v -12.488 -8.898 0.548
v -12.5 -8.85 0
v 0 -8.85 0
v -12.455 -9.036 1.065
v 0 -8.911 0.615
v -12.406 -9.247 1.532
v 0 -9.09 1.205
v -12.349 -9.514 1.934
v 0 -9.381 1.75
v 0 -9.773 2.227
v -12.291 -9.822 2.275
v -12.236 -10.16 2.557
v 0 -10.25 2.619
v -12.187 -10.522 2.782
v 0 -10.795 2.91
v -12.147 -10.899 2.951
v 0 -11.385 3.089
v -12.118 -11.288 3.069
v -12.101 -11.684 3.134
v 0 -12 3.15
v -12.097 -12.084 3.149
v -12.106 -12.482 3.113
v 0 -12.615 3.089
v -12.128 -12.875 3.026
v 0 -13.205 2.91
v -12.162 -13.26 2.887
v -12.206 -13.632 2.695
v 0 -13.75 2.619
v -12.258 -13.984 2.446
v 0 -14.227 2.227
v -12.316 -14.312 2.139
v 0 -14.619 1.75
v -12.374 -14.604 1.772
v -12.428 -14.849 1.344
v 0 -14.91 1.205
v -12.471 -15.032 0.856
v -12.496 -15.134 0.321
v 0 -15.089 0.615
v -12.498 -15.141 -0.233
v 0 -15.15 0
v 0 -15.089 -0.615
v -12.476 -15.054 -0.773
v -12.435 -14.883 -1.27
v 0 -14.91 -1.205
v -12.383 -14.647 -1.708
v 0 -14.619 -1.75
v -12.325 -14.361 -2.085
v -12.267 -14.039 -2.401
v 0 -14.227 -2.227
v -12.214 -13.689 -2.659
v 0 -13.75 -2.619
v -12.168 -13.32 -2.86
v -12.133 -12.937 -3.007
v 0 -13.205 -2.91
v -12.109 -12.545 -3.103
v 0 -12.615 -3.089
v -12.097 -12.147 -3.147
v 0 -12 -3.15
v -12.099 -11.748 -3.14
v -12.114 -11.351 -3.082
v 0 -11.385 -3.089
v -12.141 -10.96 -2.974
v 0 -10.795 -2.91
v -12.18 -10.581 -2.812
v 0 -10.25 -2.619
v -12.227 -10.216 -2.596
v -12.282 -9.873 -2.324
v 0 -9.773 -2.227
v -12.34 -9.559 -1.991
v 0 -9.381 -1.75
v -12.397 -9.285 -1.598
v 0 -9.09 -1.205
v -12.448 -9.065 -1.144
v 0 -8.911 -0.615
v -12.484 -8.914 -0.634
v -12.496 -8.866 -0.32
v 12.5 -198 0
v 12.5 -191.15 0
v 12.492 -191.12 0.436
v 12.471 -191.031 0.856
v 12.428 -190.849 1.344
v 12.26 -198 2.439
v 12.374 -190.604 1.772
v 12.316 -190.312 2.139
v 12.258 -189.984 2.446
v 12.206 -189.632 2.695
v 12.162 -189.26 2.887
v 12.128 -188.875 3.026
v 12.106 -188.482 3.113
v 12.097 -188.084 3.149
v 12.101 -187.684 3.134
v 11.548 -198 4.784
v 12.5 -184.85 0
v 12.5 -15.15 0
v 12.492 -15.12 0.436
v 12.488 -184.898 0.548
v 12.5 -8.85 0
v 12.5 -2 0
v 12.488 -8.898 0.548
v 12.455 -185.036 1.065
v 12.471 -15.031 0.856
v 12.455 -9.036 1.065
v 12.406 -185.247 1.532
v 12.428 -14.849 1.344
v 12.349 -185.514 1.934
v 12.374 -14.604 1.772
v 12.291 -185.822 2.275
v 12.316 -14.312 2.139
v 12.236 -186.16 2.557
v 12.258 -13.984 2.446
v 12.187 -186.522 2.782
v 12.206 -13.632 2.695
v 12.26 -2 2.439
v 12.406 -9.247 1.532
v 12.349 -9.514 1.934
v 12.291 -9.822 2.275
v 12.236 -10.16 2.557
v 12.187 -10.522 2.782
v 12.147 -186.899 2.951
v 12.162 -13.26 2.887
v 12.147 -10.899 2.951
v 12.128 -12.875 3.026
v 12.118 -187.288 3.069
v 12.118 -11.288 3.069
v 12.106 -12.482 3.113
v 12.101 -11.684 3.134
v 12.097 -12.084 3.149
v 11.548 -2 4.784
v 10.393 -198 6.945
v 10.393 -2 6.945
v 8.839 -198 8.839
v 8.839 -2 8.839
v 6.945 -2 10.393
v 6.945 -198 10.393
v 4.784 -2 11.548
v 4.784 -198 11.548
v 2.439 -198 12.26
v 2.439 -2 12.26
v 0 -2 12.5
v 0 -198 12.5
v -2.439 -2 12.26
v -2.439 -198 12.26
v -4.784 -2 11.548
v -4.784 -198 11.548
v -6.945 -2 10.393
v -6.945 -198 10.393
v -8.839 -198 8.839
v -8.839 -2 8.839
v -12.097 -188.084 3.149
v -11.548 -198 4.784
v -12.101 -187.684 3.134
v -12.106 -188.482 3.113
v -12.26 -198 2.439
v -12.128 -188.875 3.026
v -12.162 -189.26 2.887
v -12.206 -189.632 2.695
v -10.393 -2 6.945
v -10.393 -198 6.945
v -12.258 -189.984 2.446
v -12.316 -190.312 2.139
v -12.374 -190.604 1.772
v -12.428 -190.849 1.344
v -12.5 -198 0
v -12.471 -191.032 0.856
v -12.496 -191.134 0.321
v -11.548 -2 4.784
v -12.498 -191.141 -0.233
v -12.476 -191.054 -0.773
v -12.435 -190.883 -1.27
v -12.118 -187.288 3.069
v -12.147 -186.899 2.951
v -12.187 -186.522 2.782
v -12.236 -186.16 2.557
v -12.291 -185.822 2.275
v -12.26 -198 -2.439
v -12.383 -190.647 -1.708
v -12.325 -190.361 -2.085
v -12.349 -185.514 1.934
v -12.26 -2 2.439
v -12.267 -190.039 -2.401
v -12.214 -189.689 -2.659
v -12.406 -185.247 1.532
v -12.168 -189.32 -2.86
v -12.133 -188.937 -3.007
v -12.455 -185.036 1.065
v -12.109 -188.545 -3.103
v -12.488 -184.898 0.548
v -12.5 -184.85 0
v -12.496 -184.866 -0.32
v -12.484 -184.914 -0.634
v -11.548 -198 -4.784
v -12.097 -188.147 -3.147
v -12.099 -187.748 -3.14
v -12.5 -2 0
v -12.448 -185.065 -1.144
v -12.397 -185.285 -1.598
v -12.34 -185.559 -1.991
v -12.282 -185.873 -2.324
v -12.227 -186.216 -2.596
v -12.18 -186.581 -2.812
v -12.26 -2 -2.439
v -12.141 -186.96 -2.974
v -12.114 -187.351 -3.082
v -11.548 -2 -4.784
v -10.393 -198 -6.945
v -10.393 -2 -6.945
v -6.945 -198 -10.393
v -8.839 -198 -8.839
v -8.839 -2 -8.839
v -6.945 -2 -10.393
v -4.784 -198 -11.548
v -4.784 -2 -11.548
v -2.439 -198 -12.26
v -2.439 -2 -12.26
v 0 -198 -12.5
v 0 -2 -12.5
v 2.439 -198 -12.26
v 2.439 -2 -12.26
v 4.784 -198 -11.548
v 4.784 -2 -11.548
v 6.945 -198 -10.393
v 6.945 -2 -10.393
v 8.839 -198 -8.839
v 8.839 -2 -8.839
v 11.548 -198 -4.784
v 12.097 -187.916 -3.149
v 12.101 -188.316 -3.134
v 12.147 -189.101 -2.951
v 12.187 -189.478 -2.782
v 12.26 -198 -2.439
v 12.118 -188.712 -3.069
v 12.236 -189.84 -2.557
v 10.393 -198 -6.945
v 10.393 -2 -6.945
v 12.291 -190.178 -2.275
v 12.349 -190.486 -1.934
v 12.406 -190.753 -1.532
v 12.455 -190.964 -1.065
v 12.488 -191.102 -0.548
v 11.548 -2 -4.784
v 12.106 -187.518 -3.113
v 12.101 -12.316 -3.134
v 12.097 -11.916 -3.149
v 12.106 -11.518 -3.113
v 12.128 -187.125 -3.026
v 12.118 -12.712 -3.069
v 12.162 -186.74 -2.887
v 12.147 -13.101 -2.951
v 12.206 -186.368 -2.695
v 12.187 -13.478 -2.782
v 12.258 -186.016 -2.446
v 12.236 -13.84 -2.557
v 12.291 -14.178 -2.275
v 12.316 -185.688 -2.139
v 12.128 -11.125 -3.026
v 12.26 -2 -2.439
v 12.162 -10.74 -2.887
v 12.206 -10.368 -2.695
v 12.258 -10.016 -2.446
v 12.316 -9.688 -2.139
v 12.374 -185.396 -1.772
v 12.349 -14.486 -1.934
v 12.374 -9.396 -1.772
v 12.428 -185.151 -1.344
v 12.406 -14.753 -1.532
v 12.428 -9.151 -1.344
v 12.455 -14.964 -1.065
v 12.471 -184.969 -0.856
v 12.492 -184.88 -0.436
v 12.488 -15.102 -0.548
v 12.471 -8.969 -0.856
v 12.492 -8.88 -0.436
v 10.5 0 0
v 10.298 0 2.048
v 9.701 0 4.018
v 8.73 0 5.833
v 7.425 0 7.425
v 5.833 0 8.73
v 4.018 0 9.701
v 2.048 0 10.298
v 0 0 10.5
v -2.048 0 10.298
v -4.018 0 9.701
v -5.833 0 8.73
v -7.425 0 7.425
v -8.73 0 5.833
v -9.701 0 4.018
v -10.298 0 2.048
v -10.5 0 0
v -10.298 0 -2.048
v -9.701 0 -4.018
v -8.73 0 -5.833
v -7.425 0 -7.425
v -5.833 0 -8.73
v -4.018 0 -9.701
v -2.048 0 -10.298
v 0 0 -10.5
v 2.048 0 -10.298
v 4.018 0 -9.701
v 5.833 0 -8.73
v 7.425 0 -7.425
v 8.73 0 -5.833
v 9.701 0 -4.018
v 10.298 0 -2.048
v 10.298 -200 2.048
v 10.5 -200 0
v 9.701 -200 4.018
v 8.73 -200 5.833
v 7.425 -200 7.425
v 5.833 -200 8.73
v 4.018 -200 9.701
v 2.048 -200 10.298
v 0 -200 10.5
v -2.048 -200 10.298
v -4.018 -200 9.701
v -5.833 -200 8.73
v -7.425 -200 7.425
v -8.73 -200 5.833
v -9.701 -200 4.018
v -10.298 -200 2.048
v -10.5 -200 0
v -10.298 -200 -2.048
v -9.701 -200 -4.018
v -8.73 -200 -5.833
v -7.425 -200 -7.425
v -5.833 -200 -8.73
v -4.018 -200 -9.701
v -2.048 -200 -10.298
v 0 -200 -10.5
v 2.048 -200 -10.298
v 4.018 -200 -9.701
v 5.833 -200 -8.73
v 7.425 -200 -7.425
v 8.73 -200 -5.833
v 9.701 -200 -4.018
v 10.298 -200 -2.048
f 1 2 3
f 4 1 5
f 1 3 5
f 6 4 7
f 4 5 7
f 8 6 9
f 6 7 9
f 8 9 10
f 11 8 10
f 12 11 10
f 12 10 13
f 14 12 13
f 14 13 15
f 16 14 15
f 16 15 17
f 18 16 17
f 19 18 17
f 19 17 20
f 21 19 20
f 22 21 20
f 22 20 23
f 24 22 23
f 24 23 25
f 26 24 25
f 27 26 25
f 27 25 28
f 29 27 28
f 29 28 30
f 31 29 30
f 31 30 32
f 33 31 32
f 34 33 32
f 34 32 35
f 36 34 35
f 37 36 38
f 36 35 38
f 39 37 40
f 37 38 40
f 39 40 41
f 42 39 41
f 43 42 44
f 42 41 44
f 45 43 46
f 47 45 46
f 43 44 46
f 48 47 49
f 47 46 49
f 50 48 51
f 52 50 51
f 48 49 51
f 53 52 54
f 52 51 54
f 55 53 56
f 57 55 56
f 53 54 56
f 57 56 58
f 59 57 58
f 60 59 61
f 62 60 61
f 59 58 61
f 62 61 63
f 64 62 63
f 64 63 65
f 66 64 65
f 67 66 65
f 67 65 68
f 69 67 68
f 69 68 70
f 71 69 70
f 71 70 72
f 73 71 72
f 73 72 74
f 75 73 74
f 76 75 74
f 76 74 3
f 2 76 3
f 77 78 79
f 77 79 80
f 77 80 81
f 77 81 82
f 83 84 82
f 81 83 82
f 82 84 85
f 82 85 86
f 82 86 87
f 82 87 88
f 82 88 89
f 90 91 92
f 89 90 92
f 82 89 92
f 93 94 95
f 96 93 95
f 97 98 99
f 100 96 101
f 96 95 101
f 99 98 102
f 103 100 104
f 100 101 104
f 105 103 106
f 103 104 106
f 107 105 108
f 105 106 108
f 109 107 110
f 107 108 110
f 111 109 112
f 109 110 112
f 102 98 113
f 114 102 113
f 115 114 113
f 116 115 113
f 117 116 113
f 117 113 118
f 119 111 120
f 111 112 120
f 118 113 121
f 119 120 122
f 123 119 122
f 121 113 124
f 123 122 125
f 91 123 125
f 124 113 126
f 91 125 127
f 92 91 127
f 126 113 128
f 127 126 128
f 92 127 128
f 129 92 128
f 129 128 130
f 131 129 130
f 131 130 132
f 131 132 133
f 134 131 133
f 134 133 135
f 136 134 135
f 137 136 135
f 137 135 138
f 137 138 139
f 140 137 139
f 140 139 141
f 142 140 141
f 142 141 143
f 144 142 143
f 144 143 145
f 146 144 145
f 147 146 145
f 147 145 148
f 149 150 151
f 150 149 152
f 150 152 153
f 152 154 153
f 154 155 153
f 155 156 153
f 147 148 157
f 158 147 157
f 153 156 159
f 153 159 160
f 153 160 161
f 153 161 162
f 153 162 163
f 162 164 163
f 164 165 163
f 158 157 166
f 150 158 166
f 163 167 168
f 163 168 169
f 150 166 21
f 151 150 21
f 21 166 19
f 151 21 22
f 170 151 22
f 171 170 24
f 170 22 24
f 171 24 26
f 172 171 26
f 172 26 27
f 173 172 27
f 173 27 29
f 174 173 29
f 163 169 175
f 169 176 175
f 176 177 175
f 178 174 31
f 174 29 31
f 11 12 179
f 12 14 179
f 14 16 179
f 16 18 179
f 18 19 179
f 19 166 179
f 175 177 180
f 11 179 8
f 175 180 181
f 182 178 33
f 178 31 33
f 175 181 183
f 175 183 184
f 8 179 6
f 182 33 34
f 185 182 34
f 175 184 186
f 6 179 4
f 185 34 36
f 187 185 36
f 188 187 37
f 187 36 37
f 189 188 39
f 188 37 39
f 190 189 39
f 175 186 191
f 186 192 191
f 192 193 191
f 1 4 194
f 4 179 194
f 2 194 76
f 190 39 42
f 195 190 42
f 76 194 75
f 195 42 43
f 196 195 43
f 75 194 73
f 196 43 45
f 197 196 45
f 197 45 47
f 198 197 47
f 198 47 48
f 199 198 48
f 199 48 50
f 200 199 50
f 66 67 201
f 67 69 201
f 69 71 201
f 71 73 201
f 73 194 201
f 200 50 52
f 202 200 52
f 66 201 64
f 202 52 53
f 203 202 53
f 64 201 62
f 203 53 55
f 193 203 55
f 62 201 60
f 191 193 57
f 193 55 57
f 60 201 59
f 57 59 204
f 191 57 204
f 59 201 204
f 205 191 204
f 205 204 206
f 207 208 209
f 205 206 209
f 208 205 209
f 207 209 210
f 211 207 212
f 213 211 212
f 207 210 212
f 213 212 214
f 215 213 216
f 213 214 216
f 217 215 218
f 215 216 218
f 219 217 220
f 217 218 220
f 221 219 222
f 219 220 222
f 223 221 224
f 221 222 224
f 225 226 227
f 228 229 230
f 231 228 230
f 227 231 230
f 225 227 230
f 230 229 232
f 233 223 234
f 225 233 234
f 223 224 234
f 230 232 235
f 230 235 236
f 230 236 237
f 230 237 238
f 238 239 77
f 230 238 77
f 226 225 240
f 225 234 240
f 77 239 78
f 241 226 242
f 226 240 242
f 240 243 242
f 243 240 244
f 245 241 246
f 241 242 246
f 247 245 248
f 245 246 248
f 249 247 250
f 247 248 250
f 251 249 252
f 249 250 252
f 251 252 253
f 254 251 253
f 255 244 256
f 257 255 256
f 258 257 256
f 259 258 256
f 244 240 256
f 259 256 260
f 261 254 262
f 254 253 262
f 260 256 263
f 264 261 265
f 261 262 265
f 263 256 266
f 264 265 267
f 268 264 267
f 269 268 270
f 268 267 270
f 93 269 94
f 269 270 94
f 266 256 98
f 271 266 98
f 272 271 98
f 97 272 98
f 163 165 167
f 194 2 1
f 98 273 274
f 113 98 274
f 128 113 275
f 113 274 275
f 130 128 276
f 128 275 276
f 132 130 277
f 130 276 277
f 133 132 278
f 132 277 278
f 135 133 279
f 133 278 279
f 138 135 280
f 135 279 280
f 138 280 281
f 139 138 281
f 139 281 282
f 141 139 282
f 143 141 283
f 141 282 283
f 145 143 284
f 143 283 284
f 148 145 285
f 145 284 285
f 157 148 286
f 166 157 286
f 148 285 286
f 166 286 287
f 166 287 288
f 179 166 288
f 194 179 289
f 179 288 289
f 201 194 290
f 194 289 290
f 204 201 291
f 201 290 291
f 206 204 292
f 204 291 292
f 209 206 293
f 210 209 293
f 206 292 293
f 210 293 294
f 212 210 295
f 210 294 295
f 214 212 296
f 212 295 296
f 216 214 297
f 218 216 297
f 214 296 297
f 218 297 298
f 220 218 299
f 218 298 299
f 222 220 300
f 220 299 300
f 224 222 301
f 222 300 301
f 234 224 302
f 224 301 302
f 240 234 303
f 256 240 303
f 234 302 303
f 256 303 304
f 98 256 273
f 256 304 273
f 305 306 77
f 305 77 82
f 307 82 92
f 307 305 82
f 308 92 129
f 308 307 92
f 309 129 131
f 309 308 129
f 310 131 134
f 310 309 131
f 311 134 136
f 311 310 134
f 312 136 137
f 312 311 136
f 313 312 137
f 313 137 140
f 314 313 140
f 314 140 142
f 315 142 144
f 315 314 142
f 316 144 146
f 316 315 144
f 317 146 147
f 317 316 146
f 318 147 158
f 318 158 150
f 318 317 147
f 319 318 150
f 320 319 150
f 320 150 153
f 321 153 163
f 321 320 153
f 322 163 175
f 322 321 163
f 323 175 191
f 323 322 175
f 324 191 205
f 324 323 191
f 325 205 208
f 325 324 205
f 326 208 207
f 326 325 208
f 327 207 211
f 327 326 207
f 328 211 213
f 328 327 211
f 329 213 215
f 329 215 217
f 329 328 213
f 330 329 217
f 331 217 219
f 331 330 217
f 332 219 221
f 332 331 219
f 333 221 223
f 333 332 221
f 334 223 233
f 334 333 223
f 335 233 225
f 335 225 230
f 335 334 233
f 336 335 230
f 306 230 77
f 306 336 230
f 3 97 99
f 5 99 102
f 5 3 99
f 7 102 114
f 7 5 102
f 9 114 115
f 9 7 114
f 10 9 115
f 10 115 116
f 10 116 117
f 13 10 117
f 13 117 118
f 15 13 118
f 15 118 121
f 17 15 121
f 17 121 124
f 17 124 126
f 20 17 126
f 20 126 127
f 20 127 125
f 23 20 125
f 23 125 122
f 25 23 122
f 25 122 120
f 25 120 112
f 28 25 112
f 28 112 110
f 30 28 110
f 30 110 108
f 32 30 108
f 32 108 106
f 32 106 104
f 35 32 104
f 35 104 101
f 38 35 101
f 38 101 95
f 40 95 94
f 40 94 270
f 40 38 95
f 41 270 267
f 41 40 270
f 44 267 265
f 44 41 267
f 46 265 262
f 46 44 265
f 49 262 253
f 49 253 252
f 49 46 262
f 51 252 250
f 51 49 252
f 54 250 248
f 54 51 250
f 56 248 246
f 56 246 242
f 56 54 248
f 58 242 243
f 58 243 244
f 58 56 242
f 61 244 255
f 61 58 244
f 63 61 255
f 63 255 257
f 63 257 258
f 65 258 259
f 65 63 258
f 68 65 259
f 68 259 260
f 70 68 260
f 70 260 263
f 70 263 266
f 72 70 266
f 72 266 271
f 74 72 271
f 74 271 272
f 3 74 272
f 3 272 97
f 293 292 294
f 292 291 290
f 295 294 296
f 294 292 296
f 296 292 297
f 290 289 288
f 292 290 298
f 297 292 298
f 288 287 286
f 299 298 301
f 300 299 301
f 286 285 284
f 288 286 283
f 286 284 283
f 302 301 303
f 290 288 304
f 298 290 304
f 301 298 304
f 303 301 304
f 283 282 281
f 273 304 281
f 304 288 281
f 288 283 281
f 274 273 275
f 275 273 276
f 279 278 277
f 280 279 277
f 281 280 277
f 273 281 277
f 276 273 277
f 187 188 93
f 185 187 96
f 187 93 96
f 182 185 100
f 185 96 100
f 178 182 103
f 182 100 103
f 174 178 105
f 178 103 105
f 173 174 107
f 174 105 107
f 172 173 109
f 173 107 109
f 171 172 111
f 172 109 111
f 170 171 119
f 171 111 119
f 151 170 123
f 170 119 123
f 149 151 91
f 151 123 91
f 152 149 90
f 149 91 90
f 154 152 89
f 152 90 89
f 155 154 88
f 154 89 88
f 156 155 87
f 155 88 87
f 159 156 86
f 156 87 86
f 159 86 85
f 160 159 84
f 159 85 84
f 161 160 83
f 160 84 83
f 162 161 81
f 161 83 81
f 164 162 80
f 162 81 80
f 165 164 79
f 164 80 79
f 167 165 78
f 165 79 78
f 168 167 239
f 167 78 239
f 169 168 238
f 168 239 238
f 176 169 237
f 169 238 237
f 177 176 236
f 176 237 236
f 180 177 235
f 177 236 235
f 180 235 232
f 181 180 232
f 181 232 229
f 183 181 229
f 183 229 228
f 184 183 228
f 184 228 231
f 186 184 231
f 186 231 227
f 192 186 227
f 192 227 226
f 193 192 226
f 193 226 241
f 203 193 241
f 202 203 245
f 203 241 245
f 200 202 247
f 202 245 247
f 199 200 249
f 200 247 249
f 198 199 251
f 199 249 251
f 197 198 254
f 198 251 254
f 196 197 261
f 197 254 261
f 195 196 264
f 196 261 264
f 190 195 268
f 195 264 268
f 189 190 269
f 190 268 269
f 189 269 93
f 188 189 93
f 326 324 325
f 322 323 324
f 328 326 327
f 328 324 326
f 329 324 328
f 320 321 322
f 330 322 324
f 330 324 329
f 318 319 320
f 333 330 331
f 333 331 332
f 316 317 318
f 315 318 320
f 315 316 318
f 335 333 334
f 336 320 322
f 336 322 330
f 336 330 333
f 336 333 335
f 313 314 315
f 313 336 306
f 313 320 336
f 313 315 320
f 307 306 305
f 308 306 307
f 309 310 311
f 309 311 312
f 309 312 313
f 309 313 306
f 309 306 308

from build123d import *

# Parameters (mm, degrees)
F0_R     = 12.5
F1_DEPTH = 200
F2_R     = 3.15
F3_DEPTH = 65
F4_SIZE  = 2


with BuildPart() as f1:
    # F0 (on Front) → F1 (new body)
    with BuildSketch(Plane.XZ):
        Circle(F0_R)
    extrude(amount=F1_DEPTH)

    # F2 (on Right) → F3 (cut, symmetric)
    with BuildSketch(Plane.YZ):
        with Locations((-12, 0)):
            Circle(F2_R)
        with Locations((-188, 0)):
            Circle(F2_R)
    extrude(amount=F3_DEPTH, both=True, mode=Mode.SUBTRACT)

    # F4
    f4_edges = [f1.edges().sort_by_distance(p)[0] for p in [
        (-12.5, 0, 0),
        (-12.5, -200, 0),
    ]]
    chamfer(f4_edges, length=F4_SIZE)


solid = f1.part
